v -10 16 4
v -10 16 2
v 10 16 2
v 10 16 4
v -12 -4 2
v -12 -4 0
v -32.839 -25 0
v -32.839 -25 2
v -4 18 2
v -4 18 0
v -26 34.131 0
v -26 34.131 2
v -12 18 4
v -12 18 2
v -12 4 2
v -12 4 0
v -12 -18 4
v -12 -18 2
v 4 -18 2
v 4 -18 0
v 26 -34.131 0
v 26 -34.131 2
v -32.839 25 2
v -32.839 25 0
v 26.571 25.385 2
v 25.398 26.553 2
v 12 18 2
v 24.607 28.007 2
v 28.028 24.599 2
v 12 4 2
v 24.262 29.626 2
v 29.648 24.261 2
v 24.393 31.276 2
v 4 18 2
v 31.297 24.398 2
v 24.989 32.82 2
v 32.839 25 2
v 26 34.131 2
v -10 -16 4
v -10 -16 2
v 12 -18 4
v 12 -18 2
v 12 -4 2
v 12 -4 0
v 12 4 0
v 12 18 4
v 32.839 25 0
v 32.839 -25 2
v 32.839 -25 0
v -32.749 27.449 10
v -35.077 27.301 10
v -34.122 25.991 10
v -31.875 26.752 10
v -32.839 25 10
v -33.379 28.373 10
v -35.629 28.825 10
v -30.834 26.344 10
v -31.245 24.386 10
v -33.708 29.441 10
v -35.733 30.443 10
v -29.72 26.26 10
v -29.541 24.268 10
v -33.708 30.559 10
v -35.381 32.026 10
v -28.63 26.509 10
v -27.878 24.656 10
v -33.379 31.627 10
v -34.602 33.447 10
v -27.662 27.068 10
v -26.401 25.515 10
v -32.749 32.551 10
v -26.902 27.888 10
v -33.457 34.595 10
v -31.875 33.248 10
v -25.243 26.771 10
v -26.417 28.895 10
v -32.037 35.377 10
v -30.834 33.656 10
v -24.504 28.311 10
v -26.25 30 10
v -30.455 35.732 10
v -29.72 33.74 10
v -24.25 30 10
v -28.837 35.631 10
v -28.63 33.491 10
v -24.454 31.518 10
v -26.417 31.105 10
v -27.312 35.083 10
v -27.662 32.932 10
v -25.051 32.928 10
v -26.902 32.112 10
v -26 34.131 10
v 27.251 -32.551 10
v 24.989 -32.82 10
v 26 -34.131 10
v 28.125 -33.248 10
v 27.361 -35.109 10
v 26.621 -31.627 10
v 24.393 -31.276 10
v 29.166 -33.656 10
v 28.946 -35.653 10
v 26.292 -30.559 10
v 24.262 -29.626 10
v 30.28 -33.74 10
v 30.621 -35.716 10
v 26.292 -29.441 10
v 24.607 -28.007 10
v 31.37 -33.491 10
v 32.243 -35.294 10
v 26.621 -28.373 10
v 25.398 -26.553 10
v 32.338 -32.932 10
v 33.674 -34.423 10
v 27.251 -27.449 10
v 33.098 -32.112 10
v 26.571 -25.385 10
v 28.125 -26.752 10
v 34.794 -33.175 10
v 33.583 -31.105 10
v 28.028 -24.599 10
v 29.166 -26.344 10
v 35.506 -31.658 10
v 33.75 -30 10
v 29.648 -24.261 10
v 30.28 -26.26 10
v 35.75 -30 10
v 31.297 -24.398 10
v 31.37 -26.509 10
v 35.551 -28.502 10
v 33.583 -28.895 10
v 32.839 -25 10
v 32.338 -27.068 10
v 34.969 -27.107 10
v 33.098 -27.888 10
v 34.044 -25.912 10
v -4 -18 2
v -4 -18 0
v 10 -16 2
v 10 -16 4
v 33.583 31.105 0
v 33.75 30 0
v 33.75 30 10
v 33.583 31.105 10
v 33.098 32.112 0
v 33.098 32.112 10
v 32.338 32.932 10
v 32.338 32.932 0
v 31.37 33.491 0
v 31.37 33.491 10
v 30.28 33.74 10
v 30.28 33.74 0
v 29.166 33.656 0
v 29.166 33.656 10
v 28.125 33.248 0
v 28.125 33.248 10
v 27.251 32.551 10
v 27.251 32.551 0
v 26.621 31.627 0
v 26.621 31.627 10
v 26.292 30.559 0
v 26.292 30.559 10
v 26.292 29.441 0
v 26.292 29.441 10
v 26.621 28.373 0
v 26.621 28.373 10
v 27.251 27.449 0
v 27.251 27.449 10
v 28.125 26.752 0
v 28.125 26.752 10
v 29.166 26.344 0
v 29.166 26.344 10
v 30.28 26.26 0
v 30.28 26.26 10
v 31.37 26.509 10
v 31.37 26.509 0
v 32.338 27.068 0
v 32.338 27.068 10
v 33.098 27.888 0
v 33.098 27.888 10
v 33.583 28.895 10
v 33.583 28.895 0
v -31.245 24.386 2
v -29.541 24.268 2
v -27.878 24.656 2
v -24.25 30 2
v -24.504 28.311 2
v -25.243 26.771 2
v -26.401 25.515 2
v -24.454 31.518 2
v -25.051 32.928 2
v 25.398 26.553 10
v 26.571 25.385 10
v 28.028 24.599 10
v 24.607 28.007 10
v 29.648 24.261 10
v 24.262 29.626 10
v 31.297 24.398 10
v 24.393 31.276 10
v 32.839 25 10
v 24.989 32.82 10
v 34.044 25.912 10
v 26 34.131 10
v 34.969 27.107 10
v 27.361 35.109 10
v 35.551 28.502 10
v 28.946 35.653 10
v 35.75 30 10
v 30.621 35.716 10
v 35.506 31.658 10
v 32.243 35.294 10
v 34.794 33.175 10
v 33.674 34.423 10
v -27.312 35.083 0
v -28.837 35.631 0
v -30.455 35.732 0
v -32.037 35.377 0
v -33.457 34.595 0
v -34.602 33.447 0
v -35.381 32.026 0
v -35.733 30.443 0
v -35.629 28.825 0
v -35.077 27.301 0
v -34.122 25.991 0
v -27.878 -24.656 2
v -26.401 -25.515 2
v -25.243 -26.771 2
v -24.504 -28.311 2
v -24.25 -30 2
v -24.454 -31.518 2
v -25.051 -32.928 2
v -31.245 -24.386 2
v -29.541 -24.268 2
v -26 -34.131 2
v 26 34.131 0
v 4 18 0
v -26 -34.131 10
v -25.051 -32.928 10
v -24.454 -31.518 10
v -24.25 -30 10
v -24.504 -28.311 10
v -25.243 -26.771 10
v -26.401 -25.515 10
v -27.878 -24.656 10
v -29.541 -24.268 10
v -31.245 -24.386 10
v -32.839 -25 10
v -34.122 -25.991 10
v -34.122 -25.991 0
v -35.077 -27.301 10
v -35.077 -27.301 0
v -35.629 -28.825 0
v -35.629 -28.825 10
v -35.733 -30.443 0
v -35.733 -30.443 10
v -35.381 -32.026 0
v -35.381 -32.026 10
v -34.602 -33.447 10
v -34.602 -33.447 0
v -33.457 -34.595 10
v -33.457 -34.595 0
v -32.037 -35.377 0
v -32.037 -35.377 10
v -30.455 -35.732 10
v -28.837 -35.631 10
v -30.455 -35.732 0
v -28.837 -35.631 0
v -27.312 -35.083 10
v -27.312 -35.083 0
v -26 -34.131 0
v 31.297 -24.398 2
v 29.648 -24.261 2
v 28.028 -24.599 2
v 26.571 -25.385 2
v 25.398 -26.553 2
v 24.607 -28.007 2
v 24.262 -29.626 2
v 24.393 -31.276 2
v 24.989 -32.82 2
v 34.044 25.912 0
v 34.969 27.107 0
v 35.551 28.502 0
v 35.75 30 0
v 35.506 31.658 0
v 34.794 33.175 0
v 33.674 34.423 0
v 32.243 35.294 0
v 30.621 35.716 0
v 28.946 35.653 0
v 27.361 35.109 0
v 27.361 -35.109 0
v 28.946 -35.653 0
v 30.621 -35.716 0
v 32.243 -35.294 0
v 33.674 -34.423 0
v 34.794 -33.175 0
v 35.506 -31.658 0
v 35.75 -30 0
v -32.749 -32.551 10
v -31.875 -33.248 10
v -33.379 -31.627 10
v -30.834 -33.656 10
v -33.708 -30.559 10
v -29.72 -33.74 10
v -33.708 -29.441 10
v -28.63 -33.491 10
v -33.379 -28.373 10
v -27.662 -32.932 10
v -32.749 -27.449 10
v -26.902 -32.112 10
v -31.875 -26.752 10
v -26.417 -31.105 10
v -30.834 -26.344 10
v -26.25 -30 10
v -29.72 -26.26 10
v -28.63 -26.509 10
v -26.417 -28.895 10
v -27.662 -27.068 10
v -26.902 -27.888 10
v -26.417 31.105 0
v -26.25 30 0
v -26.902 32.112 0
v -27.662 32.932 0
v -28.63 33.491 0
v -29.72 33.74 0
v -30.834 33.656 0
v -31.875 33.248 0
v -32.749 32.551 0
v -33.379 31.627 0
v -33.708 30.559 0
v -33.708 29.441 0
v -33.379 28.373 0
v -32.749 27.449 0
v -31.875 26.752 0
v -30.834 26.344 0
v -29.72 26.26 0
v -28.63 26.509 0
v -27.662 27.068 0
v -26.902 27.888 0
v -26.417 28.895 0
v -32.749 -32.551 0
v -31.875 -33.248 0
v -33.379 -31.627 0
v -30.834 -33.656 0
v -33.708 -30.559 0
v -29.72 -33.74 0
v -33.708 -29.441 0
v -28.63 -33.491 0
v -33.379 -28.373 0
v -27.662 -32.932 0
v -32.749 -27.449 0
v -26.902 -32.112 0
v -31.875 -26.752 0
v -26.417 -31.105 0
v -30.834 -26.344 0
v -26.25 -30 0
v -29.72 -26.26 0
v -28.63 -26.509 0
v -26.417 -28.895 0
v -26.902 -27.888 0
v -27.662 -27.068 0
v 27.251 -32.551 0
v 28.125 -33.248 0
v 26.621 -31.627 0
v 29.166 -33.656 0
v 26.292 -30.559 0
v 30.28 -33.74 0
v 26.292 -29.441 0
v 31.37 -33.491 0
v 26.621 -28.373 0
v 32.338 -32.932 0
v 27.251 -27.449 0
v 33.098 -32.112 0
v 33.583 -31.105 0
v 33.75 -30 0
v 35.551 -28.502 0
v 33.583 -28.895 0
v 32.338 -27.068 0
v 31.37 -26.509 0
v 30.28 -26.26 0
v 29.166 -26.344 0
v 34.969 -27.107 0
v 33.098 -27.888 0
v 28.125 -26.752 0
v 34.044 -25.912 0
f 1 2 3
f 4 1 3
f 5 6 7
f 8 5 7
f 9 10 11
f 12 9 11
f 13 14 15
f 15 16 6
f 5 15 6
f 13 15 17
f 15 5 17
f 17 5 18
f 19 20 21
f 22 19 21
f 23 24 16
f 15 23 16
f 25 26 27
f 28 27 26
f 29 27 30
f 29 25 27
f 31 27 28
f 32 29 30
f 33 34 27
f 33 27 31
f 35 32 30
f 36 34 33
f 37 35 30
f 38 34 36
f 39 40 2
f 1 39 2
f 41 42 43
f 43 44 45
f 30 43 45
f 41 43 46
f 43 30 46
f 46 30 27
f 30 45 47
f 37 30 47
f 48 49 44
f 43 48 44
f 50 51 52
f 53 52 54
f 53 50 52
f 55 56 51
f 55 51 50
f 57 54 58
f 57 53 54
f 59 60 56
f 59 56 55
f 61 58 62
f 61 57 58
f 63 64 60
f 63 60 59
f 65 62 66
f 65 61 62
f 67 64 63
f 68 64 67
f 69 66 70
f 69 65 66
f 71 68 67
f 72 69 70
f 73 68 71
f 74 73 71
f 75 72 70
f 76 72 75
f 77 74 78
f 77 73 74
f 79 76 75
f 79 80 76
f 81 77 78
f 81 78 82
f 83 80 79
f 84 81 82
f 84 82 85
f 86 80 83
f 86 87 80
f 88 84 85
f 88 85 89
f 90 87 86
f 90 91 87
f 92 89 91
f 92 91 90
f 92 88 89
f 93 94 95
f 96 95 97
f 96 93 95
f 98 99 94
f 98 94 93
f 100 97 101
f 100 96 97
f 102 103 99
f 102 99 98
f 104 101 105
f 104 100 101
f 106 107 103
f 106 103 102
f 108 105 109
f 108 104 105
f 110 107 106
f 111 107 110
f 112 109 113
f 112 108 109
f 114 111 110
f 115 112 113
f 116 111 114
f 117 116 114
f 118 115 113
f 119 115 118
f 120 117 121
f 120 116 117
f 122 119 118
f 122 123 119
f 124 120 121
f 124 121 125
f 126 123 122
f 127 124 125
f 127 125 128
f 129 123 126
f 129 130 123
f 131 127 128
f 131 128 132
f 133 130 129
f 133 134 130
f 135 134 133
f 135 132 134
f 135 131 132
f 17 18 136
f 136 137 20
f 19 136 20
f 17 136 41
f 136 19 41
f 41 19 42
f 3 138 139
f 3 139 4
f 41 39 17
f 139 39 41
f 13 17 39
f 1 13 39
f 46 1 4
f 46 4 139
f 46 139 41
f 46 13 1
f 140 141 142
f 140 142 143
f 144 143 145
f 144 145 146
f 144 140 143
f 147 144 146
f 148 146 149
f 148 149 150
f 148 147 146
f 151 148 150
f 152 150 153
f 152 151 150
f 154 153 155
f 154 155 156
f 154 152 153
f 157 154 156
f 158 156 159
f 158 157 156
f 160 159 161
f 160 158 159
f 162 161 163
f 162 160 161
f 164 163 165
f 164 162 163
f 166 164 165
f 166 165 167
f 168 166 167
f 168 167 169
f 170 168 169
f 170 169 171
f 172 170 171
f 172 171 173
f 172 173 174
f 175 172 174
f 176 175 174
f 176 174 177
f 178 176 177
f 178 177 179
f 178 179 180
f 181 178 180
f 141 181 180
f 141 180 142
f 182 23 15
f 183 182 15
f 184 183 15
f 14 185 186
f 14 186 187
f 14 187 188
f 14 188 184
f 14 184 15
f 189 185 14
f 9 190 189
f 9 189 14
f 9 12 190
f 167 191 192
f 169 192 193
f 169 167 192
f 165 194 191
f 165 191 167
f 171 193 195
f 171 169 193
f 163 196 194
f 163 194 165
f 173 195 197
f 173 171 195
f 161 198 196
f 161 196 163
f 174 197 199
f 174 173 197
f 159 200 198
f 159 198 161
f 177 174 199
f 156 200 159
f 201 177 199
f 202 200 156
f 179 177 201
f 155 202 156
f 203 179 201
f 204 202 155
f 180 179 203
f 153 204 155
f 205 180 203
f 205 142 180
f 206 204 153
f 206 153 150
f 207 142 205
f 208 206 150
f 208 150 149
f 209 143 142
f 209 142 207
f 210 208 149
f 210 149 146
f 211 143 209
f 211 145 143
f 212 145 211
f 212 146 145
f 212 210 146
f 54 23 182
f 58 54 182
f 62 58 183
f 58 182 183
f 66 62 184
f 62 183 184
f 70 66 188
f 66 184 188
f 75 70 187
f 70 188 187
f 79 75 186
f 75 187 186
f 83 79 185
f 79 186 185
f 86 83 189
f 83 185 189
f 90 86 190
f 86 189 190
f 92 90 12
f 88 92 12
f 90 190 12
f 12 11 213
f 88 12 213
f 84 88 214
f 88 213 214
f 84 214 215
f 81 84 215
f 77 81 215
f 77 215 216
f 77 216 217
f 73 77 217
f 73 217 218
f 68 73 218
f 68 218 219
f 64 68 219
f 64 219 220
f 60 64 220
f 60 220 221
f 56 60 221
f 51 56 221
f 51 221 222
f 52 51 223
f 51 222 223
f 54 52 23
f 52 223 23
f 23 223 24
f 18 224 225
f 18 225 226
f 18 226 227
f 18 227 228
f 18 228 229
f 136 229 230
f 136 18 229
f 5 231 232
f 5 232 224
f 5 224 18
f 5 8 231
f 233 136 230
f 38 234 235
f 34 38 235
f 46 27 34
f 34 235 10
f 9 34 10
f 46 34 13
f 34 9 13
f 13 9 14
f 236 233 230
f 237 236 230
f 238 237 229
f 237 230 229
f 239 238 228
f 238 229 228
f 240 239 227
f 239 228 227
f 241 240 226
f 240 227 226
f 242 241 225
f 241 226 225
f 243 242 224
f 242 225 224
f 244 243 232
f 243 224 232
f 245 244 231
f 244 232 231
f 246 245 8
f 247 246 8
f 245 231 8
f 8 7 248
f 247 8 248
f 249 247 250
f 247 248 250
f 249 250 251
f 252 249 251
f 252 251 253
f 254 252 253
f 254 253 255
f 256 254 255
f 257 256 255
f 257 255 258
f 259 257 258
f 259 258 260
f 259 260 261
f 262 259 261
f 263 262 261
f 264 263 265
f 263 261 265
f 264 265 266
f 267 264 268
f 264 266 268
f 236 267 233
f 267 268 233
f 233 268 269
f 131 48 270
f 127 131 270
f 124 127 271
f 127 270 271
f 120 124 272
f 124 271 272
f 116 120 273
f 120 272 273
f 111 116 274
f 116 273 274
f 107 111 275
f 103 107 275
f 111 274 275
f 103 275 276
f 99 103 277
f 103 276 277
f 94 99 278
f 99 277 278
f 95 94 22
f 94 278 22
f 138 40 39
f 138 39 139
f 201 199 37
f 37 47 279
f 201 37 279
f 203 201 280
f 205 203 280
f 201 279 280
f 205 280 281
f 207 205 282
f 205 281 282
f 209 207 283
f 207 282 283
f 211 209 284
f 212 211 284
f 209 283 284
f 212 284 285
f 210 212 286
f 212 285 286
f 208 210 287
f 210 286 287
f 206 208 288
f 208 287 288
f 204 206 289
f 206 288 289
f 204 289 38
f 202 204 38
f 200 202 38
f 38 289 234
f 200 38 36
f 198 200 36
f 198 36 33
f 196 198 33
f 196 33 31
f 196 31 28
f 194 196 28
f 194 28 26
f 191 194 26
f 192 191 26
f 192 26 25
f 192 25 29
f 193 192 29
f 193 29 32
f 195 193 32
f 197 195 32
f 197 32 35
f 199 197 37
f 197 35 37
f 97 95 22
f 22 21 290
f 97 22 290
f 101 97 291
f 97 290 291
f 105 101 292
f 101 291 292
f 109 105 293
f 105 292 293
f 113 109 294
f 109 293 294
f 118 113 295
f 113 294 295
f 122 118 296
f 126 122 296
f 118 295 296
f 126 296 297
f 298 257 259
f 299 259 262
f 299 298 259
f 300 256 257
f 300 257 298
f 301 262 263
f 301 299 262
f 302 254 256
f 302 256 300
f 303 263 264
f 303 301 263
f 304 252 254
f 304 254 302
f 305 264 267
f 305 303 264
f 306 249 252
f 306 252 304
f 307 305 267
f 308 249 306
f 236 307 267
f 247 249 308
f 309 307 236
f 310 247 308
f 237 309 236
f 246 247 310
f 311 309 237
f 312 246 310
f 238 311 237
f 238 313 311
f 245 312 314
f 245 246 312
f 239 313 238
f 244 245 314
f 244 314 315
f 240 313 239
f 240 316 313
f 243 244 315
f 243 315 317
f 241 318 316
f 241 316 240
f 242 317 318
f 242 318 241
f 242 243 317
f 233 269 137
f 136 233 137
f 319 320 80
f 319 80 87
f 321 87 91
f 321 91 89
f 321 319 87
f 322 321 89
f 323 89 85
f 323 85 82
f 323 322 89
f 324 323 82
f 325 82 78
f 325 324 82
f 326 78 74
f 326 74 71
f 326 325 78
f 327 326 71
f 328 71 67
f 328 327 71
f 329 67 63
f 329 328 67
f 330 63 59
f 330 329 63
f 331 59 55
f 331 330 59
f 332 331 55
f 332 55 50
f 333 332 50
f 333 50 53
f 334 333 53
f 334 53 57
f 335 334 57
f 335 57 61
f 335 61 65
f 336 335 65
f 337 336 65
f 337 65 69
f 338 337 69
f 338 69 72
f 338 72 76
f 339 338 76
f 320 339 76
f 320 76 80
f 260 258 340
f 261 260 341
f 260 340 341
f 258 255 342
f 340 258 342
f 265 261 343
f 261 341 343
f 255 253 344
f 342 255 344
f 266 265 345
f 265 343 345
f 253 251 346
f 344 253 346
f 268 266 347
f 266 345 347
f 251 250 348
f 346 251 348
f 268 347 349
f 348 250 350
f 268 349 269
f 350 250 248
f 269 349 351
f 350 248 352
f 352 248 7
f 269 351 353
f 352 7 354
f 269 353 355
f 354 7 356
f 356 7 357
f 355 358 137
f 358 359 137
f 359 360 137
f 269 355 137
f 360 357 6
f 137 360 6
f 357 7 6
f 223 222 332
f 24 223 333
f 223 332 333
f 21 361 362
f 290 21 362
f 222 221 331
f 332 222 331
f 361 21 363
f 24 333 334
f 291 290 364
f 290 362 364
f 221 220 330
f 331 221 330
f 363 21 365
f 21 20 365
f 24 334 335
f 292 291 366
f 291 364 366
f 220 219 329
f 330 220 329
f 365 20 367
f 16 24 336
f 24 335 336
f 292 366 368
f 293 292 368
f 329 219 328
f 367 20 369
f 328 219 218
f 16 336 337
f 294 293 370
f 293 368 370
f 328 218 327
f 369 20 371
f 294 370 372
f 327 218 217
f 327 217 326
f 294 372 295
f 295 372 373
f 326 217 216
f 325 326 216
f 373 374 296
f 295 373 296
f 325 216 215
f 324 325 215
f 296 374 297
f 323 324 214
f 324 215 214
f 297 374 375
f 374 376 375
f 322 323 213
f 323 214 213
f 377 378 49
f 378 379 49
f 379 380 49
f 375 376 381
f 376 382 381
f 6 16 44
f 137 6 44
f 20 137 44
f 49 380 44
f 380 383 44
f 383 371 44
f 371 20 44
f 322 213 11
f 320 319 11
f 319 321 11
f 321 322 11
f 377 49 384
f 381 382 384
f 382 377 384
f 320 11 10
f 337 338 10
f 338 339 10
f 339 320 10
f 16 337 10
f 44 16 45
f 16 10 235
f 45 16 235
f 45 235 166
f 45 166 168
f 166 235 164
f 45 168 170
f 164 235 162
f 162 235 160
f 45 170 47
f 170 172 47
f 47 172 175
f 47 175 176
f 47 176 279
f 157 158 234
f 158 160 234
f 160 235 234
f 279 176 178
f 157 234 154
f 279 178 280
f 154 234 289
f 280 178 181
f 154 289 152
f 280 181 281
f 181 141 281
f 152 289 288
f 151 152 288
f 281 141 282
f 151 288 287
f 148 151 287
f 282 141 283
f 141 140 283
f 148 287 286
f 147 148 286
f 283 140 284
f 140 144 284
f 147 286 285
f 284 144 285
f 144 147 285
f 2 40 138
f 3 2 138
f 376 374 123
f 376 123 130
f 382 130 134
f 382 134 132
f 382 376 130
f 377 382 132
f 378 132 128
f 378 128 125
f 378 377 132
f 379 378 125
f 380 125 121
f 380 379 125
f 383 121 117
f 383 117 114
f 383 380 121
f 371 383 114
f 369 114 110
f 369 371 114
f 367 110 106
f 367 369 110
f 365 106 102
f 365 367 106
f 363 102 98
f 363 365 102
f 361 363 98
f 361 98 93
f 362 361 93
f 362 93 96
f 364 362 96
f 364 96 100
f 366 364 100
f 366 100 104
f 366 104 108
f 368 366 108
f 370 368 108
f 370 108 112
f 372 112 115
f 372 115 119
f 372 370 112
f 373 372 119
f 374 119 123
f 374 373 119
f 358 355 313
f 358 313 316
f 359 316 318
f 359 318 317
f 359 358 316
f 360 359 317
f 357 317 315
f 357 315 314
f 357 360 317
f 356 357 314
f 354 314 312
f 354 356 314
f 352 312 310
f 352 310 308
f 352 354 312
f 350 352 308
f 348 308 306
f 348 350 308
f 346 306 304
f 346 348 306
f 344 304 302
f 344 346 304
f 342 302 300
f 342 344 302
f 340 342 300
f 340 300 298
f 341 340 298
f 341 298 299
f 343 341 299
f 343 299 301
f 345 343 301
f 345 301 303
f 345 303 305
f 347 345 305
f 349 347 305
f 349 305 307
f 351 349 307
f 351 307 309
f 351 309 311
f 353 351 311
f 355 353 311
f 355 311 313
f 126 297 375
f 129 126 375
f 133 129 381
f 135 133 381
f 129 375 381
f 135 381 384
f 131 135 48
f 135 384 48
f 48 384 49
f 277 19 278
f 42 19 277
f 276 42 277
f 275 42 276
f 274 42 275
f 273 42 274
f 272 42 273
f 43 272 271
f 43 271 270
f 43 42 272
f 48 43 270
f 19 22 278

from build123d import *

# Parameters (mm, degrees)
F0_W     = 20
F0_H     = 32
F0_R     = 3.75
F1_DEPTH = 2
F2_DEPTH = 10
F3_DEPTH = 4


with BuildPart() as f1:
    # F0 (on Top) → F1 (new body)
    with BuildSketch(Plane.XY):
        Polygon((12, 4), (12, 18), (4, 18), (-4, 18), (-12, 18), (-12, 4), (-12, -4), (-12, -18), (-4, -18), (4, -18), (12, -18), (12, -4), align=None)
        Rectangle(F0_W, F0_H, mode=Mode.SUBTRACT)
        Rectangle(F0_W, F0_H)
        with BuildLine():
            Line((-12, 18), (-4, 18))
            Line((-4, 18), (-26, 34.1306779105))
            ThreePointArc((-26, 34.1306779105), (-24.7055453539, 32.2430448056), (-24.25, 30))
            ThreePointArc((-24.25, 30), (-27.1072816845, 25.0306257188), (-32.8394541729, 25))
            Line((-32.8394541729, 25), (-12, 4))
            Line((-12, 4), (-12, 18))
        make_face()
        with BuildLine():
            Line((4, 18), (12, 18))
            Line((12, 18), (12, 4))
            Line((12, 4), (32.8394541729, 25))
            ThreePointArc((32.8394541729, 25), (25.397931288, 26.552760007), (26, 34.1306779105))
            Line((26, 34.1306779105), (4, 18))
        make_face()
        with BuildLine():
            Line((32.8394541729, -25), (12, -4))
            Line((12, -4), (12, -18))
            Line((12, -18), (4, -18))
            Line((4, -18), (26, -34.1306779105))
            ThreePointArc((26, -34.1306779105), (25.397931288, -26.552760007), (32.8394541729, -25))
        make_face()
        with BuildLine():
            Line((-12, -18), (-12, -4))
            Line((-12, -4), (-32.8394541729, -25))
            ThreePointArc((-32.8394541729, -25), (-27.1072816845, -25.0306257188), (-24.25, -30))
            ThreePointArc((-24.25, -30), (-24.7055453539, -32.2430448056), (-26, -34.1306779105))
            Line((-26, -34.1306779105), (-4, -18))
            Line((-4, -18), (-12, -18))
        make_face()
        with BuildLine():
            ThreePointArc((-24.25, 30), (-24.7055453539, 32.2430448056), (-26, 34.1306779105))
            ThreePointArc((-26, 34.1306779105), (-34.602068712, 33.447239993), (-32.8394541729, 25))
            ThreePointArc((-32.8394541729, 25), (-27.1072816845, 25.0306257188), (-24.25, 30))
        make_face()
        with Locations((-30, 30)):
            Circle(F0_R, mode=Mode.SUBTRACT)
        with BuildLine():
            ThreePointArc((35.75, 30), (32.2430448056, 35.2944546461), (26, 34.1306779105))
            ThreePointArc((26, 34.1306779105), (25.397931288, 26.552760007), (32.8394541729, 25))
            ThreePointArc((32.8394541729, 25), (34.9693742812, 27.1072816845), (35.75, 30))
        make_face()
        with Locations((30, 30)):
            Circle(F0_R, mode=Mode.SUBTRACT)
        with BuildLine():
            ThreePointArc((-24.25, -30), (-27.1072816845, -25.0306257188), (-32.8394541729, -25))
            ThreePointArc((-32.8394541729, -25), (-34.602068712, -33.447239993), (-26, -34.1306779105))
            ThreePointArc((-26, -34.1306779105), (-24.7055453539, -32.2430448056), (-24.25, -30))
        make_face()
        with Locations((-30, -30)):
            Circle(F0_R, mode=Mode.SUBTRACT)
    extrude(amount=F1_DEPTH)

    # F0 (on Top) → F2 (join)
    with BuildSketch(Plane.XY):
        with BuildLine():
            ThreePointArc((-24.25, 30), (-24.7055453539, 32.2430448056), (-26, 34.1306779105))
            ThreePointArc((-26, 34.1306779105), (-34.602068712, 33.447239993), (-32.8394541729, 25))
            ThreePointArc((-32.8394541729, 25), (-27.1072816845, 25.0306257188), (-24.25, 30))
        make_face()
        with Locations((-30, 30)):
            Circle(F0_R, mode=Mode.SUBTRACT)
        with BuildLine():
            ThreePointArc((35.75, 30), (32.2430448056, 35.2944546461), (26, 34.1306779105))
            ThreePointArc((26, 34.1306779105), (25.397931288, 26.552760007), (32.8394541729, 25))
            ThreePointArc((32.8394541729, 25), (34.9693742812, 27.1072816845), (35.75, 30))
        make_face()
        with Locations((30, 30)):
            Circle(F0_R, mode=Mode.SUBTRACT)
        with BuildLine():
            ThreePointArc((35.75, -30), (34.9693742812, -27.1072816845), (32.8394541729, -25))
            ThreePointArc((32.8394541729, -25), (25.397931288, -26.552760007), (26, -34.1306779105))
            ThreePointArc((26, -34.1306779105), (32.2430448056, -35.2944546461), (35.75, -30))
        make_face()
        with Locations((30, -30)):
            Circle(F0_R, mode=Mode.SUBTRACT)
        with BuildLine():
            ThreePointArc((-24.25, -30), (-27.1072816845, -25.0306257188), (-32.8394541729, -25))
            ThreePointArc((-32.8394541729, -25), (-34.602068712, -33.447239993), (-26, -34.1306779105))
            ThreePointArc((-26, -34.1306779105), (-24.7055453539, -32.2430448056), (-24.25, -30))
        make_face()
        with Locations((-30, -30)):
            Circle(F0_R, mode=Mode.SUBTRACT)
    extrude(amount=F2_DEPTH)

    # F0 (on Top) → F3 (join)
    with BuildSketch(Plane.XY):
        Polygon((12, 4), (12, 18), (4, 18), (-4, 18), (-12, 18), (-12, 4), (-12, -4), (-12, -18), (-4, -18), (4, -18), (12, -18), (12, -4), align=None)
        Rectangle(F0_W, F0_H, mode=Mode.SUBTRACT)
    extrude(amount=F3_DEPTH)


solid = f1.part
